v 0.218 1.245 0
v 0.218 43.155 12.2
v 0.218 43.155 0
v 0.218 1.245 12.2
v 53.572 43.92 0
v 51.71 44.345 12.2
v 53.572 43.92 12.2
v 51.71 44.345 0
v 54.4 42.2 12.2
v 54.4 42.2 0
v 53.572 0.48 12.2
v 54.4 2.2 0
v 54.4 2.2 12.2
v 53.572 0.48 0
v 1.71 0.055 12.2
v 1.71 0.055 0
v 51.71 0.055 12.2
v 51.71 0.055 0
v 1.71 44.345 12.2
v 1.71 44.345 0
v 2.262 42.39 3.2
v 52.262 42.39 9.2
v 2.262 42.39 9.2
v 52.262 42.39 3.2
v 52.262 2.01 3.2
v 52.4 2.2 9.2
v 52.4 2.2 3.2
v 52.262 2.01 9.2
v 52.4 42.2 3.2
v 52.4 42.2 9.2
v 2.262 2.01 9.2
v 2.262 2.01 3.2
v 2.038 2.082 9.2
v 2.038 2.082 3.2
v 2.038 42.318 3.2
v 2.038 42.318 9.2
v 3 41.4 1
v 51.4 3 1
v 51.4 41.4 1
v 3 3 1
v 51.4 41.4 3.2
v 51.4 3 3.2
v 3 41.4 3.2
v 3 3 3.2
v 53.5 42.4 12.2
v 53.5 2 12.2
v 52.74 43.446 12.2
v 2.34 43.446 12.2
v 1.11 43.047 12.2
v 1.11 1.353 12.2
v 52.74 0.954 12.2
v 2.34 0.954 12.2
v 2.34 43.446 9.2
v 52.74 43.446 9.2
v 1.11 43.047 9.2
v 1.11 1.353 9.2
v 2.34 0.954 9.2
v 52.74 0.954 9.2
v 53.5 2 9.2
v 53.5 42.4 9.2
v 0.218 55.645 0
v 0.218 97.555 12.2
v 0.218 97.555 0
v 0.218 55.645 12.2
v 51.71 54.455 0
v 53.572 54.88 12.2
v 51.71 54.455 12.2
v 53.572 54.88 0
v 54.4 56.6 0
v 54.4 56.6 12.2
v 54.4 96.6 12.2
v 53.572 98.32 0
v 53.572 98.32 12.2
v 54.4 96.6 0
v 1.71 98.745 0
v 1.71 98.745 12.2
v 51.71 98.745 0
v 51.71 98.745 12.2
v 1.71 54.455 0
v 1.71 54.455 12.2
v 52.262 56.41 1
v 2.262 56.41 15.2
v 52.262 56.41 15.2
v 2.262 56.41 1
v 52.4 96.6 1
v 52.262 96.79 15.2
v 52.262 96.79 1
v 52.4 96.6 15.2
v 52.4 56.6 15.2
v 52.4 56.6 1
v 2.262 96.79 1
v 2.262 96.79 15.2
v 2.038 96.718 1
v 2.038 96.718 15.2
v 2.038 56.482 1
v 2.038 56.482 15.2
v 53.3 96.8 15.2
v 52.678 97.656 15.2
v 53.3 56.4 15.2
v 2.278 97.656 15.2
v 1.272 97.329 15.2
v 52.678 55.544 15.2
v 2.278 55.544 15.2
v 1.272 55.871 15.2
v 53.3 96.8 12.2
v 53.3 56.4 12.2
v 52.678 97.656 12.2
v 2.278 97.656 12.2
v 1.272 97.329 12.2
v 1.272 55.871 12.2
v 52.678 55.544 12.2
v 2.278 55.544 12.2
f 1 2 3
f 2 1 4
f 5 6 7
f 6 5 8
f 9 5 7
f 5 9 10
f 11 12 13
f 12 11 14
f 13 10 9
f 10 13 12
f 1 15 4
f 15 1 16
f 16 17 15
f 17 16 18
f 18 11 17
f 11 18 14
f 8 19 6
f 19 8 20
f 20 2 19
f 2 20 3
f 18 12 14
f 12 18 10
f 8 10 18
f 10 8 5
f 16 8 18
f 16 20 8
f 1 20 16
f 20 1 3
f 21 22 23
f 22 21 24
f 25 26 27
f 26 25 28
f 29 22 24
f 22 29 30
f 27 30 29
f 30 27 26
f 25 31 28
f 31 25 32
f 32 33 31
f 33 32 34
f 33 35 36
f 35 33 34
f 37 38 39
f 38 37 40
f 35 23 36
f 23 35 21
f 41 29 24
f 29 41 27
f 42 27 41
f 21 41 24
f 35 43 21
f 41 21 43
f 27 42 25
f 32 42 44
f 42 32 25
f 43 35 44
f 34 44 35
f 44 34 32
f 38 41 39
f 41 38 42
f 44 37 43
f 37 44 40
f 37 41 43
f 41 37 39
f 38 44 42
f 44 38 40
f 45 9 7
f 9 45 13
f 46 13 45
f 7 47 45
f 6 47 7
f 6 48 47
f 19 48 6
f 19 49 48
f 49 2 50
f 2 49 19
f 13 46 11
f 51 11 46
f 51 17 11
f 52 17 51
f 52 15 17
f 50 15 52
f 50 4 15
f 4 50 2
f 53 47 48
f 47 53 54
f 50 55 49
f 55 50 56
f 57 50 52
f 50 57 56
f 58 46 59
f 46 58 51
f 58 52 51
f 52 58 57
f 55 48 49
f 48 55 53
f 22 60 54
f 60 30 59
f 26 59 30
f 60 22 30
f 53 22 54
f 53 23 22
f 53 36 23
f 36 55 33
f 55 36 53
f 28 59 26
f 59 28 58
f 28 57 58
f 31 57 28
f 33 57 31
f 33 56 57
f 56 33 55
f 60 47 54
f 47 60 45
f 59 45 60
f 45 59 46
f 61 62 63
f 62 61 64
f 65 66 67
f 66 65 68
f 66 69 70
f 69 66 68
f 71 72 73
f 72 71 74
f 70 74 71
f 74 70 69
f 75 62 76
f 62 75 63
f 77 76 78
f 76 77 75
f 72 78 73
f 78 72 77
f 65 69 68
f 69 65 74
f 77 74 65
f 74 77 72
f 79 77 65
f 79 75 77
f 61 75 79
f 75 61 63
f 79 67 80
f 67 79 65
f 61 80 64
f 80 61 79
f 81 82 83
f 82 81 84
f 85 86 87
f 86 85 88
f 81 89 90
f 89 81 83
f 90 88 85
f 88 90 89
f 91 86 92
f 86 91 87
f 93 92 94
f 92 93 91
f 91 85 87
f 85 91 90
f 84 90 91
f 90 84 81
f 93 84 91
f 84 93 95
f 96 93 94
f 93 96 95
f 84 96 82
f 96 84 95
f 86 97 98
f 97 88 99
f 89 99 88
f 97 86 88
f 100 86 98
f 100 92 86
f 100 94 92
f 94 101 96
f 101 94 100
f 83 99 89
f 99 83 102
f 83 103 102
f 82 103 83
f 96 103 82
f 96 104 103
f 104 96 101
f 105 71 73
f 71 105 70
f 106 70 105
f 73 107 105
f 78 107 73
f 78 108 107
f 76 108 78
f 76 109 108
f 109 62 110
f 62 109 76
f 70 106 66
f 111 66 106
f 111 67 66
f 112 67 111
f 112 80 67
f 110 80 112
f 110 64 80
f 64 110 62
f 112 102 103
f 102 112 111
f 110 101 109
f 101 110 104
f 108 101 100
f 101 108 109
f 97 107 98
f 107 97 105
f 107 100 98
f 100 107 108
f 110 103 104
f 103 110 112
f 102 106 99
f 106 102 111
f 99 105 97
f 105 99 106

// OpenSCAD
// file: lib_metric_sizes.scad
m2   = 2.8;
m2_5 = 3.2;
m3   = 3.6;
m4   = 4.8;
m5   = 5.6;
m6   = 6.4;
// file: lib_nuts.scad
include <lib_metric_sizes.scad>

m2_nut = [5.2, 1.7];
m3_nut = [6.8, 2.3];
m4_nut = [8.4, 2.8];

m2_flat_nut = [5.2, 2.0];
m3_flat_nut = [6.8, 2.0];
m4_flat_nut = [8.4, 2.0];

//m2_nylon_nut = [, ];
//m2_5_nylon_nut = [, ];
//m3_nylon_nut = [, ];
m4_nylon_nut = [8.4, 3.3];
m5_nylon_nut = [10.0, 4.0];
m6_nylon_nut = [12.4, 5.0];
// file: lib_self_tapping_screws.scad
include <lib_metric_sizes.scad>

m3_st_roundhead = [7.2, 2.0];
m3_st_flathead = [7.2, 0];
// file: lib_machine_screws.scad
include <lib_metric_sizes.scad>

m2x12_shaft = [m2, 12.0];
m2x19_shaft = [m2, 19.0];
m3x12_shaft = [m3, 12.0];
m3x17_shaft = [m3, 17.0];
m3x19_shaft = [m3, 19.0];
m4x12_shaft = [m4, 12.0];
m4x25_shaft = [m4, 25.0];

m2_roundhead = [4.0, 1.0];
m3_roundhead = [5.6, 1.7];
m4_roundhead = [7.2, 2.3];

m2_flathead = [4.0, 1.0];
m3_flathead = [5.6, 1.0];
m4_flathead = [7.2, 1.0];
// file: lib_gadgets.scad
include <lib_machine_screws.scad>
include <lib_self_tapping_screws.scad>
include <lib_nuts.scad>

module stud(shaft, self_tapping=false)
{
	ds = self_tapping ? shaft[0]-0.4 : shaft[0];
	
	cylinder(h=shaft[1], d=ds);
}

module bolt(head, shaft, countersink=false, self_tapping=false) {
	ds = self_tapping ? shaft[0]-0.4 : shaft[0];
	
	cylinder(h=head[1], d=head[0]);
	cylinder(h=shaft[1]+head[1], d=ds);
	if (countersink == true) {
		translate([0, 0, head[1]]) {
			cylinder(h=head[0], d1=head[0], d2=0);
		}
	}
}

module nut(head, countersink=false) {
	cylinder(h=head[1], d=head[0], $fn=6);
	if (countersink == true) {
		translate([0, 0, head[1]]) {
			cylinder(h=head[0], d1=head[0], d2=0, $fn=6);
		}
	}
}

module post(pos, radius, height) {
	translate([pos[0], pos[1], 0]) { 
		cylinder(h=height, r=radius); 
	}
}

module spacer(pos, outer_r, inner_r, height) {
	translate([pos[0], pos[1], 0]) { 
		difference() {
			cylinder(h=height, r=outer_r); 
			if (inner_r > 0) {
				cylinder(h=height+0.0001, r=inner_r); 
			}
		}
	}
}

module grid(size, xx, yy) {
	if (size > 0) {
		for (x = [0 : size : xx] ) {
			translate([x, 0, 0]) cube([0.8, yy, 0.4]);
		}
		for (y = [0 : size : yy] ) {
			translate([0, y, 0]) cube([xx, 0.8, 0.4]);
		}
	}
}
// file: lib_soft.scad
/** 
 * An OpenSCAD library for creating shapes with rounded edges
 *
 * @author Paul Generes <paul.generes@gmail.com>
 * @example soft_example.scad
 */
 
module soft_cube(size=[1, 1, 1], center=false, cr=1) {
	tr = [cr, cr, cr];

    translate(tr) {
        minkowski() {
            sphere(cr);
            cube([size[0]-2*cr, size[1]-2*cr, size[2]-2*cr], center);
        }
    }
}

module softxyz_cube(size=1, center=false, cr=[1, 1, 1]) {
	tr = cr;

    translate(tr) {
        minkowski() {
			scale(cr) {
				sphere(1);
			}
            cube([size[0]-2*cr[0], size[1]-2*cr[1], size[2]-2*cr[2]], center);
        }
    }
}

module softz_cube(size=1, center=false, cr=1) {
	tr = [cr, cr, 0];

    translate(tr) {
        minkowski() {
			cylinder(h=0.00001, r=cr);
			cube([size[0]-2*cr, size[1]-2*cr, size[2]-0.00001], center);
        }
    }
}
// main file
// Test Enclosure

include <lib_enclosure.scad>

function fillet_z()         = 0;
function tolerance()        = 0.2;
function device_x()         = 50;
function device_y()         = 40;
function pcb_z()            = 1.5;
function spacing()          = 10;
function riser_z()          = 2;
function riser_thickness()  = 1;
function wall_thickness()   = 2;
function bottom_thickness() = 1;
function top_thickness()    = 1;
function device_z()         = 20;
function friction()         = 3;
function split()            = 0.5;

//finished_enclosure();
enclosure();

module left_cutouts() {}
module right_cutouts() {}
module front_cutouts() {}
module back_cutouts() {}
module top_cutouts() {}
module bottom_cutouts() {}
module cutouts() {}
module attachments() {}
module stand_offs() {}
module final_attachments() {}
